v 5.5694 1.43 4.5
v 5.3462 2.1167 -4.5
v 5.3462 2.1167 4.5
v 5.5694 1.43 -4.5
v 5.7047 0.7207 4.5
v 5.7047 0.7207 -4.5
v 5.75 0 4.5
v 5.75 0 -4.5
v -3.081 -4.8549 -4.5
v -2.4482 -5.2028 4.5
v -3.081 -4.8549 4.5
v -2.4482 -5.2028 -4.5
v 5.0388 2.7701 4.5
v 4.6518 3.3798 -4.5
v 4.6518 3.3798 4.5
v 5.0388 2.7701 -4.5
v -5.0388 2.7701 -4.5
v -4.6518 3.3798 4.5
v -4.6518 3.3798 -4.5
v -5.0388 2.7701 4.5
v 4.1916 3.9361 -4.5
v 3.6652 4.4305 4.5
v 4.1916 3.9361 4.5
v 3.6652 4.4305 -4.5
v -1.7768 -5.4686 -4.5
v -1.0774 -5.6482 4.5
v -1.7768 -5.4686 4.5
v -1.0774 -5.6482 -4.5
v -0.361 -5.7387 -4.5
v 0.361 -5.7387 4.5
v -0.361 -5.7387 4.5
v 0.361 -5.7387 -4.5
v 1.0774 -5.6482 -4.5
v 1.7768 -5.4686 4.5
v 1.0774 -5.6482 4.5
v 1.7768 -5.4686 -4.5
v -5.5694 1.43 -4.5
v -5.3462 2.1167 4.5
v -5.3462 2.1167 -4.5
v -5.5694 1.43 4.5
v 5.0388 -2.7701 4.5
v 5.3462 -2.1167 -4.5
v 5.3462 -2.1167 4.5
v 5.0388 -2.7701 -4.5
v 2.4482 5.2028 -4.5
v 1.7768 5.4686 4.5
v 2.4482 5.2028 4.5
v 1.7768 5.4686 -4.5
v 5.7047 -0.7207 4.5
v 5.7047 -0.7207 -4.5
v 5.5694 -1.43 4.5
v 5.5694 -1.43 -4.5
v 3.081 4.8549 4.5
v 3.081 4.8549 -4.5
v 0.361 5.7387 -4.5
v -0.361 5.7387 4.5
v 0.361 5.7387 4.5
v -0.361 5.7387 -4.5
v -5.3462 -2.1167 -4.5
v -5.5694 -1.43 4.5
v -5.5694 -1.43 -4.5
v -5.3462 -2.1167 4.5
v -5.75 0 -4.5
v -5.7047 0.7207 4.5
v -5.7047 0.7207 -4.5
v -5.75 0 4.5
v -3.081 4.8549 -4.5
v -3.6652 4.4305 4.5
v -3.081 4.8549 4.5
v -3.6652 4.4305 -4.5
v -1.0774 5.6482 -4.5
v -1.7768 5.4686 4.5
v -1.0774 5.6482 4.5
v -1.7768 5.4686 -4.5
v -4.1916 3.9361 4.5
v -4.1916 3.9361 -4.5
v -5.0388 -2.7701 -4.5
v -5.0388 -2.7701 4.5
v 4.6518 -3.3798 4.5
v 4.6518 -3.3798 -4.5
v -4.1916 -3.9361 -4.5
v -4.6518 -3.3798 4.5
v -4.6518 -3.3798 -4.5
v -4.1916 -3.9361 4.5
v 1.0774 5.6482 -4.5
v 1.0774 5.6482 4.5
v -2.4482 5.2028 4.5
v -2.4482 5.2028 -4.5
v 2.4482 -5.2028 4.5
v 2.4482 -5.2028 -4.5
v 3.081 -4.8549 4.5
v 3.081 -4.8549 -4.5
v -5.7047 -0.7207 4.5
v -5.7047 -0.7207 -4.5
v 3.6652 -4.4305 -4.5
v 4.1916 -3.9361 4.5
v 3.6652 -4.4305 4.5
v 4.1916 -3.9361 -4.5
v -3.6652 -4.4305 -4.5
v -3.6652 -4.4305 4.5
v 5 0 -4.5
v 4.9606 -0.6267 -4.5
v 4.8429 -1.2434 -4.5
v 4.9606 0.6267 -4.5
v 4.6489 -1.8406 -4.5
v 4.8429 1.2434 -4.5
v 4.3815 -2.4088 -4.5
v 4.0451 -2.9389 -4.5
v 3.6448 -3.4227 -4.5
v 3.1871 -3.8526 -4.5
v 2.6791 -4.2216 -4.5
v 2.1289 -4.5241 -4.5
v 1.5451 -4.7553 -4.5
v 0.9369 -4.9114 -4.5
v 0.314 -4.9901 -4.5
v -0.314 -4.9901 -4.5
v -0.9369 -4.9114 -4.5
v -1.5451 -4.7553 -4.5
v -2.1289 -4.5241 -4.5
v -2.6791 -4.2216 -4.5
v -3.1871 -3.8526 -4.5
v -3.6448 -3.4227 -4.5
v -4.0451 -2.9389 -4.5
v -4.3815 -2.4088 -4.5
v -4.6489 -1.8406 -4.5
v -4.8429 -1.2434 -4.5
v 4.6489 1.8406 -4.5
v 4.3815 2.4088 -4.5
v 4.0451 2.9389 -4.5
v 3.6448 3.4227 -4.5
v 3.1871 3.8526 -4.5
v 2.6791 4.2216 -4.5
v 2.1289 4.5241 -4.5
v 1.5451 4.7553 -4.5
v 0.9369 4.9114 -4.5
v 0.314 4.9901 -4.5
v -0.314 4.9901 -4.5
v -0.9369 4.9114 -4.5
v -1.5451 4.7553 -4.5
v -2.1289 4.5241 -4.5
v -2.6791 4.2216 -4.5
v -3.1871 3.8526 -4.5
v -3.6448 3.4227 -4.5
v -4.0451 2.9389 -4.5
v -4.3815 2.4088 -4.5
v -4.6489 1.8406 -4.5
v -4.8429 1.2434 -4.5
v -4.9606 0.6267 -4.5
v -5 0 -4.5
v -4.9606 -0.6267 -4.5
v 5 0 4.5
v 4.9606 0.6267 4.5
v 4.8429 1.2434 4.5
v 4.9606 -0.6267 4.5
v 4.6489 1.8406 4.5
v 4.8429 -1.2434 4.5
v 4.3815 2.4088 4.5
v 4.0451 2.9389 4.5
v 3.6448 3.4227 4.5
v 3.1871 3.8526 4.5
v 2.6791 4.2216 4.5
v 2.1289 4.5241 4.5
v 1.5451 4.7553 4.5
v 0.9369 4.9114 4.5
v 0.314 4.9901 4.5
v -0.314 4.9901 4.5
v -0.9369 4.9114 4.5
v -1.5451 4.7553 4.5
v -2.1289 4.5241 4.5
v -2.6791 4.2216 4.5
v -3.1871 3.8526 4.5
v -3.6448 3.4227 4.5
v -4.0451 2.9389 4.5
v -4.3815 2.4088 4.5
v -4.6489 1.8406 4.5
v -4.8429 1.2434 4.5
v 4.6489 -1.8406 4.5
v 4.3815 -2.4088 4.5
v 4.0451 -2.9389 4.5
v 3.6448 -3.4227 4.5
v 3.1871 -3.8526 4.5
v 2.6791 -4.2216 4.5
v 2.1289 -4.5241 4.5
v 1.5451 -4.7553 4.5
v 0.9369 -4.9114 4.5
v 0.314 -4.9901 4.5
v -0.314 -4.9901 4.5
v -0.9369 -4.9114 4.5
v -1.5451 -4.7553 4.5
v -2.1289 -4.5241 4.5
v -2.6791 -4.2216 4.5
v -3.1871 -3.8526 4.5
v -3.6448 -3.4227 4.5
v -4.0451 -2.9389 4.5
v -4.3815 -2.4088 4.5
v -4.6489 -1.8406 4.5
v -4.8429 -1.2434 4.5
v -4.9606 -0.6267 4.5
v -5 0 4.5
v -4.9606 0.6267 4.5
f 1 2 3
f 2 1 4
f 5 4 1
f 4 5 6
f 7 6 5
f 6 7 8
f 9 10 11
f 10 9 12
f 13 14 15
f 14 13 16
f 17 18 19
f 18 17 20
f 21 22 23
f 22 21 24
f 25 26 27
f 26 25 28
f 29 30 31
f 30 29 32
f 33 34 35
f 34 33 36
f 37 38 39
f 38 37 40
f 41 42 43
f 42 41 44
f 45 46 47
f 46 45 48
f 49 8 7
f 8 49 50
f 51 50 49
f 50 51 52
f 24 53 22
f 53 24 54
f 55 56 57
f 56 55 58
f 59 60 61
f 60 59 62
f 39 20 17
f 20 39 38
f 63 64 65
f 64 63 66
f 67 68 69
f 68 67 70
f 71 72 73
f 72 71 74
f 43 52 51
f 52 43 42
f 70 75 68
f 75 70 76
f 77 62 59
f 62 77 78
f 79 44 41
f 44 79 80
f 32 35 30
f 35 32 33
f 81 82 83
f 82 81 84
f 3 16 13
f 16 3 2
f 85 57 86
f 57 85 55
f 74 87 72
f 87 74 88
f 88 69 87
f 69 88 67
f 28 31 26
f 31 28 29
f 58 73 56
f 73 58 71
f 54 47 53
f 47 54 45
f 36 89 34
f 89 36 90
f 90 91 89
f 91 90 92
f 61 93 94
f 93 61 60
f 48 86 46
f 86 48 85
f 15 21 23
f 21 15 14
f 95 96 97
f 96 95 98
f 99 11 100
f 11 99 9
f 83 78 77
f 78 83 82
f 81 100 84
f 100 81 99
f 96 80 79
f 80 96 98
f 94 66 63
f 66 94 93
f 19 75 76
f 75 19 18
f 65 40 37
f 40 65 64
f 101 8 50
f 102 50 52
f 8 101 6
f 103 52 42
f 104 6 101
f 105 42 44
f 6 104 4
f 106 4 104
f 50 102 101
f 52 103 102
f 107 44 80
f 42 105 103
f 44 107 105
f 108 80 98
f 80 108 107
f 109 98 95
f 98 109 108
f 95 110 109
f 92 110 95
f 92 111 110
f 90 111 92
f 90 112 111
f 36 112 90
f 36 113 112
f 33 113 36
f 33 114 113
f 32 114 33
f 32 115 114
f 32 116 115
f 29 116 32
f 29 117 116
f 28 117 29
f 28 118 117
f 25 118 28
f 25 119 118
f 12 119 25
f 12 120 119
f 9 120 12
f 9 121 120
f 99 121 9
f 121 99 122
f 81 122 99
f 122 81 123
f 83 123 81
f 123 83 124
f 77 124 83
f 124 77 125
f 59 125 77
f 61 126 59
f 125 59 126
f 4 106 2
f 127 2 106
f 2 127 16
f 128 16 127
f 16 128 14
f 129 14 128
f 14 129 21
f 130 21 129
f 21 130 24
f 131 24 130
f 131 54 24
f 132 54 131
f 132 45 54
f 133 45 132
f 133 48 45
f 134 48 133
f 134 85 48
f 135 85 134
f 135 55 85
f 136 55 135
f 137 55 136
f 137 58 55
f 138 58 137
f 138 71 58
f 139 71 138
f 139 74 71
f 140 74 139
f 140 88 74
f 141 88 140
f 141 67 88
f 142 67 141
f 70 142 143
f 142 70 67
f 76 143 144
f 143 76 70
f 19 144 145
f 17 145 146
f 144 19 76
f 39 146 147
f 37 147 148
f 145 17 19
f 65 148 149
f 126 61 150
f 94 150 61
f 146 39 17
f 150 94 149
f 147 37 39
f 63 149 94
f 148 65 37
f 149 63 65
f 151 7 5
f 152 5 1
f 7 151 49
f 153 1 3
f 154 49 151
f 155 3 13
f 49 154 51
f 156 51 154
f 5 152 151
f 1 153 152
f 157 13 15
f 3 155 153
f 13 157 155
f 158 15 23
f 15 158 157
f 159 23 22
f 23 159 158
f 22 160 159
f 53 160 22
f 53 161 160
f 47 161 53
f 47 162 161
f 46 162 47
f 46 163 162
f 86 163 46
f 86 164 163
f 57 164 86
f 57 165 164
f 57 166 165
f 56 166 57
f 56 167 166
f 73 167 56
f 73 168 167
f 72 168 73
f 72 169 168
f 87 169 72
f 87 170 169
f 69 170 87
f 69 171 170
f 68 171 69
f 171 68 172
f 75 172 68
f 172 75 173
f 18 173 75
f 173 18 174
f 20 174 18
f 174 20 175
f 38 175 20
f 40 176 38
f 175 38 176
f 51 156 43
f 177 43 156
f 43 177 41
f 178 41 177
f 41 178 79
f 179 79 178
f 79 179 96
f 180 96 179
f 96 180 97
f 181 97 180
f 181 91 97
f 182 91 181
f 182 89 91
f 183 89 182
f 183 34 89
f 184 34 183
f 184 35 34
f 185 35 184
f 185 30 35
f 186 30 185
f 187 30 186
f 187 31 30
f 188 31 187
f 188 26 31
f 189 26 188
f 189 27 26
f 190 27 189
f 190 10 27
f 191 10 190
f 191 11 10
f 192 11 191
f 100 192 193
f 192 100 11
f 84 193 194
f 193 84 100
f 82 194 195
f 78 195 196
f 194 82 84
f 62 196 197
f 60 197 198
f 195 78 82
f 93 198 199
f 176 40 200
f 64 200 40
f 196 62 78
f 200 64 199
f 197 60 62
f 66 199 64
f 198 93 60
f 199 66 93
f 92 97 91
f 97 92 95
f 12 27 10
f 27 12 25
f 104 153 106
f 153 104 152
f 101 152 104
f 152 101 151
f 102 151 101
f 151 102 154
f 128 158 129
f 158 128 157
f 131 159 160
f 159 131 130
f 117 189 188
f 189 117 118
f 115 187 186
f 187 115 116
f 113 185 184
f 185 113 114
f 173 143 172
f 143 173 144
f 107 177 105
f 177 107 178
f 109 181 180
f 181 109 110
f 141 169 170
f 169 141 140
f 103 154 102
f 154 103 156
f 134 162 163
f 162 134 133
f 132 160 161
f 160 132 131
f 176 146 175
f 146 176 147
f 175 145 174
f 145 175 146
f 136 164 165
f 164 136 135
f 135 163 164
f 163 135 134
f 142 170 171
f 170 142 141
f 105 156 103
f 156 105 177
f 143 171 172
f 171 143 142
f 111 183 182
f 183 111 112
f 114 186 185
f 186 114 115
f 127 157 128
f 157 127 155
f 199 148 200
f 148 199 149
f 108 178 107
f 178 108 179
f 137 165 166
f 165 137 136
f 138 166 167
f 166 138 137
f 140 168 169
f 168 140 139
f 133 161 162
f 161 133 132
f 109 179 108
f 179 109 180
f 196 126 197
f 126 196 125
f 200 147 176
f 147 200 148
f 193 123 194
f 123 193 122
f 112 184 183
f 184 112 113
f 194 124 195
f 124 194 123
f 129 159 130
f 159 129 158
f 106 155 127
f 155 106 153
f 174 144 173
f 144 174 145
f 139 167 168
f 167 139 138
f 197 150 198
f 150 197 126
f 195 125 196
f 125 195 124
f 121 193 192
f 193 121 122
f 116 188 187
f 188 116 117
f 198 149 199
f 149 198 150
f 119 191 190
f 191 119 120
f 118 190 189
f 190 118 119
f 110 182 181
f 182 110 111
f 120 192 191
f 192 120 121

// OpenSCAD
$fn = 50;


difference() {
	union() {
		translate(v = [0, 0, -4.5000000000]) {
			cylinder(h = 9, r = 5.7500000000);
		}
	}
	union() {
		translate(v = [0, 0, -100.0000000000]) {
			cylinder(h = 200, r = 5.0000000000);
		}
	}
}
